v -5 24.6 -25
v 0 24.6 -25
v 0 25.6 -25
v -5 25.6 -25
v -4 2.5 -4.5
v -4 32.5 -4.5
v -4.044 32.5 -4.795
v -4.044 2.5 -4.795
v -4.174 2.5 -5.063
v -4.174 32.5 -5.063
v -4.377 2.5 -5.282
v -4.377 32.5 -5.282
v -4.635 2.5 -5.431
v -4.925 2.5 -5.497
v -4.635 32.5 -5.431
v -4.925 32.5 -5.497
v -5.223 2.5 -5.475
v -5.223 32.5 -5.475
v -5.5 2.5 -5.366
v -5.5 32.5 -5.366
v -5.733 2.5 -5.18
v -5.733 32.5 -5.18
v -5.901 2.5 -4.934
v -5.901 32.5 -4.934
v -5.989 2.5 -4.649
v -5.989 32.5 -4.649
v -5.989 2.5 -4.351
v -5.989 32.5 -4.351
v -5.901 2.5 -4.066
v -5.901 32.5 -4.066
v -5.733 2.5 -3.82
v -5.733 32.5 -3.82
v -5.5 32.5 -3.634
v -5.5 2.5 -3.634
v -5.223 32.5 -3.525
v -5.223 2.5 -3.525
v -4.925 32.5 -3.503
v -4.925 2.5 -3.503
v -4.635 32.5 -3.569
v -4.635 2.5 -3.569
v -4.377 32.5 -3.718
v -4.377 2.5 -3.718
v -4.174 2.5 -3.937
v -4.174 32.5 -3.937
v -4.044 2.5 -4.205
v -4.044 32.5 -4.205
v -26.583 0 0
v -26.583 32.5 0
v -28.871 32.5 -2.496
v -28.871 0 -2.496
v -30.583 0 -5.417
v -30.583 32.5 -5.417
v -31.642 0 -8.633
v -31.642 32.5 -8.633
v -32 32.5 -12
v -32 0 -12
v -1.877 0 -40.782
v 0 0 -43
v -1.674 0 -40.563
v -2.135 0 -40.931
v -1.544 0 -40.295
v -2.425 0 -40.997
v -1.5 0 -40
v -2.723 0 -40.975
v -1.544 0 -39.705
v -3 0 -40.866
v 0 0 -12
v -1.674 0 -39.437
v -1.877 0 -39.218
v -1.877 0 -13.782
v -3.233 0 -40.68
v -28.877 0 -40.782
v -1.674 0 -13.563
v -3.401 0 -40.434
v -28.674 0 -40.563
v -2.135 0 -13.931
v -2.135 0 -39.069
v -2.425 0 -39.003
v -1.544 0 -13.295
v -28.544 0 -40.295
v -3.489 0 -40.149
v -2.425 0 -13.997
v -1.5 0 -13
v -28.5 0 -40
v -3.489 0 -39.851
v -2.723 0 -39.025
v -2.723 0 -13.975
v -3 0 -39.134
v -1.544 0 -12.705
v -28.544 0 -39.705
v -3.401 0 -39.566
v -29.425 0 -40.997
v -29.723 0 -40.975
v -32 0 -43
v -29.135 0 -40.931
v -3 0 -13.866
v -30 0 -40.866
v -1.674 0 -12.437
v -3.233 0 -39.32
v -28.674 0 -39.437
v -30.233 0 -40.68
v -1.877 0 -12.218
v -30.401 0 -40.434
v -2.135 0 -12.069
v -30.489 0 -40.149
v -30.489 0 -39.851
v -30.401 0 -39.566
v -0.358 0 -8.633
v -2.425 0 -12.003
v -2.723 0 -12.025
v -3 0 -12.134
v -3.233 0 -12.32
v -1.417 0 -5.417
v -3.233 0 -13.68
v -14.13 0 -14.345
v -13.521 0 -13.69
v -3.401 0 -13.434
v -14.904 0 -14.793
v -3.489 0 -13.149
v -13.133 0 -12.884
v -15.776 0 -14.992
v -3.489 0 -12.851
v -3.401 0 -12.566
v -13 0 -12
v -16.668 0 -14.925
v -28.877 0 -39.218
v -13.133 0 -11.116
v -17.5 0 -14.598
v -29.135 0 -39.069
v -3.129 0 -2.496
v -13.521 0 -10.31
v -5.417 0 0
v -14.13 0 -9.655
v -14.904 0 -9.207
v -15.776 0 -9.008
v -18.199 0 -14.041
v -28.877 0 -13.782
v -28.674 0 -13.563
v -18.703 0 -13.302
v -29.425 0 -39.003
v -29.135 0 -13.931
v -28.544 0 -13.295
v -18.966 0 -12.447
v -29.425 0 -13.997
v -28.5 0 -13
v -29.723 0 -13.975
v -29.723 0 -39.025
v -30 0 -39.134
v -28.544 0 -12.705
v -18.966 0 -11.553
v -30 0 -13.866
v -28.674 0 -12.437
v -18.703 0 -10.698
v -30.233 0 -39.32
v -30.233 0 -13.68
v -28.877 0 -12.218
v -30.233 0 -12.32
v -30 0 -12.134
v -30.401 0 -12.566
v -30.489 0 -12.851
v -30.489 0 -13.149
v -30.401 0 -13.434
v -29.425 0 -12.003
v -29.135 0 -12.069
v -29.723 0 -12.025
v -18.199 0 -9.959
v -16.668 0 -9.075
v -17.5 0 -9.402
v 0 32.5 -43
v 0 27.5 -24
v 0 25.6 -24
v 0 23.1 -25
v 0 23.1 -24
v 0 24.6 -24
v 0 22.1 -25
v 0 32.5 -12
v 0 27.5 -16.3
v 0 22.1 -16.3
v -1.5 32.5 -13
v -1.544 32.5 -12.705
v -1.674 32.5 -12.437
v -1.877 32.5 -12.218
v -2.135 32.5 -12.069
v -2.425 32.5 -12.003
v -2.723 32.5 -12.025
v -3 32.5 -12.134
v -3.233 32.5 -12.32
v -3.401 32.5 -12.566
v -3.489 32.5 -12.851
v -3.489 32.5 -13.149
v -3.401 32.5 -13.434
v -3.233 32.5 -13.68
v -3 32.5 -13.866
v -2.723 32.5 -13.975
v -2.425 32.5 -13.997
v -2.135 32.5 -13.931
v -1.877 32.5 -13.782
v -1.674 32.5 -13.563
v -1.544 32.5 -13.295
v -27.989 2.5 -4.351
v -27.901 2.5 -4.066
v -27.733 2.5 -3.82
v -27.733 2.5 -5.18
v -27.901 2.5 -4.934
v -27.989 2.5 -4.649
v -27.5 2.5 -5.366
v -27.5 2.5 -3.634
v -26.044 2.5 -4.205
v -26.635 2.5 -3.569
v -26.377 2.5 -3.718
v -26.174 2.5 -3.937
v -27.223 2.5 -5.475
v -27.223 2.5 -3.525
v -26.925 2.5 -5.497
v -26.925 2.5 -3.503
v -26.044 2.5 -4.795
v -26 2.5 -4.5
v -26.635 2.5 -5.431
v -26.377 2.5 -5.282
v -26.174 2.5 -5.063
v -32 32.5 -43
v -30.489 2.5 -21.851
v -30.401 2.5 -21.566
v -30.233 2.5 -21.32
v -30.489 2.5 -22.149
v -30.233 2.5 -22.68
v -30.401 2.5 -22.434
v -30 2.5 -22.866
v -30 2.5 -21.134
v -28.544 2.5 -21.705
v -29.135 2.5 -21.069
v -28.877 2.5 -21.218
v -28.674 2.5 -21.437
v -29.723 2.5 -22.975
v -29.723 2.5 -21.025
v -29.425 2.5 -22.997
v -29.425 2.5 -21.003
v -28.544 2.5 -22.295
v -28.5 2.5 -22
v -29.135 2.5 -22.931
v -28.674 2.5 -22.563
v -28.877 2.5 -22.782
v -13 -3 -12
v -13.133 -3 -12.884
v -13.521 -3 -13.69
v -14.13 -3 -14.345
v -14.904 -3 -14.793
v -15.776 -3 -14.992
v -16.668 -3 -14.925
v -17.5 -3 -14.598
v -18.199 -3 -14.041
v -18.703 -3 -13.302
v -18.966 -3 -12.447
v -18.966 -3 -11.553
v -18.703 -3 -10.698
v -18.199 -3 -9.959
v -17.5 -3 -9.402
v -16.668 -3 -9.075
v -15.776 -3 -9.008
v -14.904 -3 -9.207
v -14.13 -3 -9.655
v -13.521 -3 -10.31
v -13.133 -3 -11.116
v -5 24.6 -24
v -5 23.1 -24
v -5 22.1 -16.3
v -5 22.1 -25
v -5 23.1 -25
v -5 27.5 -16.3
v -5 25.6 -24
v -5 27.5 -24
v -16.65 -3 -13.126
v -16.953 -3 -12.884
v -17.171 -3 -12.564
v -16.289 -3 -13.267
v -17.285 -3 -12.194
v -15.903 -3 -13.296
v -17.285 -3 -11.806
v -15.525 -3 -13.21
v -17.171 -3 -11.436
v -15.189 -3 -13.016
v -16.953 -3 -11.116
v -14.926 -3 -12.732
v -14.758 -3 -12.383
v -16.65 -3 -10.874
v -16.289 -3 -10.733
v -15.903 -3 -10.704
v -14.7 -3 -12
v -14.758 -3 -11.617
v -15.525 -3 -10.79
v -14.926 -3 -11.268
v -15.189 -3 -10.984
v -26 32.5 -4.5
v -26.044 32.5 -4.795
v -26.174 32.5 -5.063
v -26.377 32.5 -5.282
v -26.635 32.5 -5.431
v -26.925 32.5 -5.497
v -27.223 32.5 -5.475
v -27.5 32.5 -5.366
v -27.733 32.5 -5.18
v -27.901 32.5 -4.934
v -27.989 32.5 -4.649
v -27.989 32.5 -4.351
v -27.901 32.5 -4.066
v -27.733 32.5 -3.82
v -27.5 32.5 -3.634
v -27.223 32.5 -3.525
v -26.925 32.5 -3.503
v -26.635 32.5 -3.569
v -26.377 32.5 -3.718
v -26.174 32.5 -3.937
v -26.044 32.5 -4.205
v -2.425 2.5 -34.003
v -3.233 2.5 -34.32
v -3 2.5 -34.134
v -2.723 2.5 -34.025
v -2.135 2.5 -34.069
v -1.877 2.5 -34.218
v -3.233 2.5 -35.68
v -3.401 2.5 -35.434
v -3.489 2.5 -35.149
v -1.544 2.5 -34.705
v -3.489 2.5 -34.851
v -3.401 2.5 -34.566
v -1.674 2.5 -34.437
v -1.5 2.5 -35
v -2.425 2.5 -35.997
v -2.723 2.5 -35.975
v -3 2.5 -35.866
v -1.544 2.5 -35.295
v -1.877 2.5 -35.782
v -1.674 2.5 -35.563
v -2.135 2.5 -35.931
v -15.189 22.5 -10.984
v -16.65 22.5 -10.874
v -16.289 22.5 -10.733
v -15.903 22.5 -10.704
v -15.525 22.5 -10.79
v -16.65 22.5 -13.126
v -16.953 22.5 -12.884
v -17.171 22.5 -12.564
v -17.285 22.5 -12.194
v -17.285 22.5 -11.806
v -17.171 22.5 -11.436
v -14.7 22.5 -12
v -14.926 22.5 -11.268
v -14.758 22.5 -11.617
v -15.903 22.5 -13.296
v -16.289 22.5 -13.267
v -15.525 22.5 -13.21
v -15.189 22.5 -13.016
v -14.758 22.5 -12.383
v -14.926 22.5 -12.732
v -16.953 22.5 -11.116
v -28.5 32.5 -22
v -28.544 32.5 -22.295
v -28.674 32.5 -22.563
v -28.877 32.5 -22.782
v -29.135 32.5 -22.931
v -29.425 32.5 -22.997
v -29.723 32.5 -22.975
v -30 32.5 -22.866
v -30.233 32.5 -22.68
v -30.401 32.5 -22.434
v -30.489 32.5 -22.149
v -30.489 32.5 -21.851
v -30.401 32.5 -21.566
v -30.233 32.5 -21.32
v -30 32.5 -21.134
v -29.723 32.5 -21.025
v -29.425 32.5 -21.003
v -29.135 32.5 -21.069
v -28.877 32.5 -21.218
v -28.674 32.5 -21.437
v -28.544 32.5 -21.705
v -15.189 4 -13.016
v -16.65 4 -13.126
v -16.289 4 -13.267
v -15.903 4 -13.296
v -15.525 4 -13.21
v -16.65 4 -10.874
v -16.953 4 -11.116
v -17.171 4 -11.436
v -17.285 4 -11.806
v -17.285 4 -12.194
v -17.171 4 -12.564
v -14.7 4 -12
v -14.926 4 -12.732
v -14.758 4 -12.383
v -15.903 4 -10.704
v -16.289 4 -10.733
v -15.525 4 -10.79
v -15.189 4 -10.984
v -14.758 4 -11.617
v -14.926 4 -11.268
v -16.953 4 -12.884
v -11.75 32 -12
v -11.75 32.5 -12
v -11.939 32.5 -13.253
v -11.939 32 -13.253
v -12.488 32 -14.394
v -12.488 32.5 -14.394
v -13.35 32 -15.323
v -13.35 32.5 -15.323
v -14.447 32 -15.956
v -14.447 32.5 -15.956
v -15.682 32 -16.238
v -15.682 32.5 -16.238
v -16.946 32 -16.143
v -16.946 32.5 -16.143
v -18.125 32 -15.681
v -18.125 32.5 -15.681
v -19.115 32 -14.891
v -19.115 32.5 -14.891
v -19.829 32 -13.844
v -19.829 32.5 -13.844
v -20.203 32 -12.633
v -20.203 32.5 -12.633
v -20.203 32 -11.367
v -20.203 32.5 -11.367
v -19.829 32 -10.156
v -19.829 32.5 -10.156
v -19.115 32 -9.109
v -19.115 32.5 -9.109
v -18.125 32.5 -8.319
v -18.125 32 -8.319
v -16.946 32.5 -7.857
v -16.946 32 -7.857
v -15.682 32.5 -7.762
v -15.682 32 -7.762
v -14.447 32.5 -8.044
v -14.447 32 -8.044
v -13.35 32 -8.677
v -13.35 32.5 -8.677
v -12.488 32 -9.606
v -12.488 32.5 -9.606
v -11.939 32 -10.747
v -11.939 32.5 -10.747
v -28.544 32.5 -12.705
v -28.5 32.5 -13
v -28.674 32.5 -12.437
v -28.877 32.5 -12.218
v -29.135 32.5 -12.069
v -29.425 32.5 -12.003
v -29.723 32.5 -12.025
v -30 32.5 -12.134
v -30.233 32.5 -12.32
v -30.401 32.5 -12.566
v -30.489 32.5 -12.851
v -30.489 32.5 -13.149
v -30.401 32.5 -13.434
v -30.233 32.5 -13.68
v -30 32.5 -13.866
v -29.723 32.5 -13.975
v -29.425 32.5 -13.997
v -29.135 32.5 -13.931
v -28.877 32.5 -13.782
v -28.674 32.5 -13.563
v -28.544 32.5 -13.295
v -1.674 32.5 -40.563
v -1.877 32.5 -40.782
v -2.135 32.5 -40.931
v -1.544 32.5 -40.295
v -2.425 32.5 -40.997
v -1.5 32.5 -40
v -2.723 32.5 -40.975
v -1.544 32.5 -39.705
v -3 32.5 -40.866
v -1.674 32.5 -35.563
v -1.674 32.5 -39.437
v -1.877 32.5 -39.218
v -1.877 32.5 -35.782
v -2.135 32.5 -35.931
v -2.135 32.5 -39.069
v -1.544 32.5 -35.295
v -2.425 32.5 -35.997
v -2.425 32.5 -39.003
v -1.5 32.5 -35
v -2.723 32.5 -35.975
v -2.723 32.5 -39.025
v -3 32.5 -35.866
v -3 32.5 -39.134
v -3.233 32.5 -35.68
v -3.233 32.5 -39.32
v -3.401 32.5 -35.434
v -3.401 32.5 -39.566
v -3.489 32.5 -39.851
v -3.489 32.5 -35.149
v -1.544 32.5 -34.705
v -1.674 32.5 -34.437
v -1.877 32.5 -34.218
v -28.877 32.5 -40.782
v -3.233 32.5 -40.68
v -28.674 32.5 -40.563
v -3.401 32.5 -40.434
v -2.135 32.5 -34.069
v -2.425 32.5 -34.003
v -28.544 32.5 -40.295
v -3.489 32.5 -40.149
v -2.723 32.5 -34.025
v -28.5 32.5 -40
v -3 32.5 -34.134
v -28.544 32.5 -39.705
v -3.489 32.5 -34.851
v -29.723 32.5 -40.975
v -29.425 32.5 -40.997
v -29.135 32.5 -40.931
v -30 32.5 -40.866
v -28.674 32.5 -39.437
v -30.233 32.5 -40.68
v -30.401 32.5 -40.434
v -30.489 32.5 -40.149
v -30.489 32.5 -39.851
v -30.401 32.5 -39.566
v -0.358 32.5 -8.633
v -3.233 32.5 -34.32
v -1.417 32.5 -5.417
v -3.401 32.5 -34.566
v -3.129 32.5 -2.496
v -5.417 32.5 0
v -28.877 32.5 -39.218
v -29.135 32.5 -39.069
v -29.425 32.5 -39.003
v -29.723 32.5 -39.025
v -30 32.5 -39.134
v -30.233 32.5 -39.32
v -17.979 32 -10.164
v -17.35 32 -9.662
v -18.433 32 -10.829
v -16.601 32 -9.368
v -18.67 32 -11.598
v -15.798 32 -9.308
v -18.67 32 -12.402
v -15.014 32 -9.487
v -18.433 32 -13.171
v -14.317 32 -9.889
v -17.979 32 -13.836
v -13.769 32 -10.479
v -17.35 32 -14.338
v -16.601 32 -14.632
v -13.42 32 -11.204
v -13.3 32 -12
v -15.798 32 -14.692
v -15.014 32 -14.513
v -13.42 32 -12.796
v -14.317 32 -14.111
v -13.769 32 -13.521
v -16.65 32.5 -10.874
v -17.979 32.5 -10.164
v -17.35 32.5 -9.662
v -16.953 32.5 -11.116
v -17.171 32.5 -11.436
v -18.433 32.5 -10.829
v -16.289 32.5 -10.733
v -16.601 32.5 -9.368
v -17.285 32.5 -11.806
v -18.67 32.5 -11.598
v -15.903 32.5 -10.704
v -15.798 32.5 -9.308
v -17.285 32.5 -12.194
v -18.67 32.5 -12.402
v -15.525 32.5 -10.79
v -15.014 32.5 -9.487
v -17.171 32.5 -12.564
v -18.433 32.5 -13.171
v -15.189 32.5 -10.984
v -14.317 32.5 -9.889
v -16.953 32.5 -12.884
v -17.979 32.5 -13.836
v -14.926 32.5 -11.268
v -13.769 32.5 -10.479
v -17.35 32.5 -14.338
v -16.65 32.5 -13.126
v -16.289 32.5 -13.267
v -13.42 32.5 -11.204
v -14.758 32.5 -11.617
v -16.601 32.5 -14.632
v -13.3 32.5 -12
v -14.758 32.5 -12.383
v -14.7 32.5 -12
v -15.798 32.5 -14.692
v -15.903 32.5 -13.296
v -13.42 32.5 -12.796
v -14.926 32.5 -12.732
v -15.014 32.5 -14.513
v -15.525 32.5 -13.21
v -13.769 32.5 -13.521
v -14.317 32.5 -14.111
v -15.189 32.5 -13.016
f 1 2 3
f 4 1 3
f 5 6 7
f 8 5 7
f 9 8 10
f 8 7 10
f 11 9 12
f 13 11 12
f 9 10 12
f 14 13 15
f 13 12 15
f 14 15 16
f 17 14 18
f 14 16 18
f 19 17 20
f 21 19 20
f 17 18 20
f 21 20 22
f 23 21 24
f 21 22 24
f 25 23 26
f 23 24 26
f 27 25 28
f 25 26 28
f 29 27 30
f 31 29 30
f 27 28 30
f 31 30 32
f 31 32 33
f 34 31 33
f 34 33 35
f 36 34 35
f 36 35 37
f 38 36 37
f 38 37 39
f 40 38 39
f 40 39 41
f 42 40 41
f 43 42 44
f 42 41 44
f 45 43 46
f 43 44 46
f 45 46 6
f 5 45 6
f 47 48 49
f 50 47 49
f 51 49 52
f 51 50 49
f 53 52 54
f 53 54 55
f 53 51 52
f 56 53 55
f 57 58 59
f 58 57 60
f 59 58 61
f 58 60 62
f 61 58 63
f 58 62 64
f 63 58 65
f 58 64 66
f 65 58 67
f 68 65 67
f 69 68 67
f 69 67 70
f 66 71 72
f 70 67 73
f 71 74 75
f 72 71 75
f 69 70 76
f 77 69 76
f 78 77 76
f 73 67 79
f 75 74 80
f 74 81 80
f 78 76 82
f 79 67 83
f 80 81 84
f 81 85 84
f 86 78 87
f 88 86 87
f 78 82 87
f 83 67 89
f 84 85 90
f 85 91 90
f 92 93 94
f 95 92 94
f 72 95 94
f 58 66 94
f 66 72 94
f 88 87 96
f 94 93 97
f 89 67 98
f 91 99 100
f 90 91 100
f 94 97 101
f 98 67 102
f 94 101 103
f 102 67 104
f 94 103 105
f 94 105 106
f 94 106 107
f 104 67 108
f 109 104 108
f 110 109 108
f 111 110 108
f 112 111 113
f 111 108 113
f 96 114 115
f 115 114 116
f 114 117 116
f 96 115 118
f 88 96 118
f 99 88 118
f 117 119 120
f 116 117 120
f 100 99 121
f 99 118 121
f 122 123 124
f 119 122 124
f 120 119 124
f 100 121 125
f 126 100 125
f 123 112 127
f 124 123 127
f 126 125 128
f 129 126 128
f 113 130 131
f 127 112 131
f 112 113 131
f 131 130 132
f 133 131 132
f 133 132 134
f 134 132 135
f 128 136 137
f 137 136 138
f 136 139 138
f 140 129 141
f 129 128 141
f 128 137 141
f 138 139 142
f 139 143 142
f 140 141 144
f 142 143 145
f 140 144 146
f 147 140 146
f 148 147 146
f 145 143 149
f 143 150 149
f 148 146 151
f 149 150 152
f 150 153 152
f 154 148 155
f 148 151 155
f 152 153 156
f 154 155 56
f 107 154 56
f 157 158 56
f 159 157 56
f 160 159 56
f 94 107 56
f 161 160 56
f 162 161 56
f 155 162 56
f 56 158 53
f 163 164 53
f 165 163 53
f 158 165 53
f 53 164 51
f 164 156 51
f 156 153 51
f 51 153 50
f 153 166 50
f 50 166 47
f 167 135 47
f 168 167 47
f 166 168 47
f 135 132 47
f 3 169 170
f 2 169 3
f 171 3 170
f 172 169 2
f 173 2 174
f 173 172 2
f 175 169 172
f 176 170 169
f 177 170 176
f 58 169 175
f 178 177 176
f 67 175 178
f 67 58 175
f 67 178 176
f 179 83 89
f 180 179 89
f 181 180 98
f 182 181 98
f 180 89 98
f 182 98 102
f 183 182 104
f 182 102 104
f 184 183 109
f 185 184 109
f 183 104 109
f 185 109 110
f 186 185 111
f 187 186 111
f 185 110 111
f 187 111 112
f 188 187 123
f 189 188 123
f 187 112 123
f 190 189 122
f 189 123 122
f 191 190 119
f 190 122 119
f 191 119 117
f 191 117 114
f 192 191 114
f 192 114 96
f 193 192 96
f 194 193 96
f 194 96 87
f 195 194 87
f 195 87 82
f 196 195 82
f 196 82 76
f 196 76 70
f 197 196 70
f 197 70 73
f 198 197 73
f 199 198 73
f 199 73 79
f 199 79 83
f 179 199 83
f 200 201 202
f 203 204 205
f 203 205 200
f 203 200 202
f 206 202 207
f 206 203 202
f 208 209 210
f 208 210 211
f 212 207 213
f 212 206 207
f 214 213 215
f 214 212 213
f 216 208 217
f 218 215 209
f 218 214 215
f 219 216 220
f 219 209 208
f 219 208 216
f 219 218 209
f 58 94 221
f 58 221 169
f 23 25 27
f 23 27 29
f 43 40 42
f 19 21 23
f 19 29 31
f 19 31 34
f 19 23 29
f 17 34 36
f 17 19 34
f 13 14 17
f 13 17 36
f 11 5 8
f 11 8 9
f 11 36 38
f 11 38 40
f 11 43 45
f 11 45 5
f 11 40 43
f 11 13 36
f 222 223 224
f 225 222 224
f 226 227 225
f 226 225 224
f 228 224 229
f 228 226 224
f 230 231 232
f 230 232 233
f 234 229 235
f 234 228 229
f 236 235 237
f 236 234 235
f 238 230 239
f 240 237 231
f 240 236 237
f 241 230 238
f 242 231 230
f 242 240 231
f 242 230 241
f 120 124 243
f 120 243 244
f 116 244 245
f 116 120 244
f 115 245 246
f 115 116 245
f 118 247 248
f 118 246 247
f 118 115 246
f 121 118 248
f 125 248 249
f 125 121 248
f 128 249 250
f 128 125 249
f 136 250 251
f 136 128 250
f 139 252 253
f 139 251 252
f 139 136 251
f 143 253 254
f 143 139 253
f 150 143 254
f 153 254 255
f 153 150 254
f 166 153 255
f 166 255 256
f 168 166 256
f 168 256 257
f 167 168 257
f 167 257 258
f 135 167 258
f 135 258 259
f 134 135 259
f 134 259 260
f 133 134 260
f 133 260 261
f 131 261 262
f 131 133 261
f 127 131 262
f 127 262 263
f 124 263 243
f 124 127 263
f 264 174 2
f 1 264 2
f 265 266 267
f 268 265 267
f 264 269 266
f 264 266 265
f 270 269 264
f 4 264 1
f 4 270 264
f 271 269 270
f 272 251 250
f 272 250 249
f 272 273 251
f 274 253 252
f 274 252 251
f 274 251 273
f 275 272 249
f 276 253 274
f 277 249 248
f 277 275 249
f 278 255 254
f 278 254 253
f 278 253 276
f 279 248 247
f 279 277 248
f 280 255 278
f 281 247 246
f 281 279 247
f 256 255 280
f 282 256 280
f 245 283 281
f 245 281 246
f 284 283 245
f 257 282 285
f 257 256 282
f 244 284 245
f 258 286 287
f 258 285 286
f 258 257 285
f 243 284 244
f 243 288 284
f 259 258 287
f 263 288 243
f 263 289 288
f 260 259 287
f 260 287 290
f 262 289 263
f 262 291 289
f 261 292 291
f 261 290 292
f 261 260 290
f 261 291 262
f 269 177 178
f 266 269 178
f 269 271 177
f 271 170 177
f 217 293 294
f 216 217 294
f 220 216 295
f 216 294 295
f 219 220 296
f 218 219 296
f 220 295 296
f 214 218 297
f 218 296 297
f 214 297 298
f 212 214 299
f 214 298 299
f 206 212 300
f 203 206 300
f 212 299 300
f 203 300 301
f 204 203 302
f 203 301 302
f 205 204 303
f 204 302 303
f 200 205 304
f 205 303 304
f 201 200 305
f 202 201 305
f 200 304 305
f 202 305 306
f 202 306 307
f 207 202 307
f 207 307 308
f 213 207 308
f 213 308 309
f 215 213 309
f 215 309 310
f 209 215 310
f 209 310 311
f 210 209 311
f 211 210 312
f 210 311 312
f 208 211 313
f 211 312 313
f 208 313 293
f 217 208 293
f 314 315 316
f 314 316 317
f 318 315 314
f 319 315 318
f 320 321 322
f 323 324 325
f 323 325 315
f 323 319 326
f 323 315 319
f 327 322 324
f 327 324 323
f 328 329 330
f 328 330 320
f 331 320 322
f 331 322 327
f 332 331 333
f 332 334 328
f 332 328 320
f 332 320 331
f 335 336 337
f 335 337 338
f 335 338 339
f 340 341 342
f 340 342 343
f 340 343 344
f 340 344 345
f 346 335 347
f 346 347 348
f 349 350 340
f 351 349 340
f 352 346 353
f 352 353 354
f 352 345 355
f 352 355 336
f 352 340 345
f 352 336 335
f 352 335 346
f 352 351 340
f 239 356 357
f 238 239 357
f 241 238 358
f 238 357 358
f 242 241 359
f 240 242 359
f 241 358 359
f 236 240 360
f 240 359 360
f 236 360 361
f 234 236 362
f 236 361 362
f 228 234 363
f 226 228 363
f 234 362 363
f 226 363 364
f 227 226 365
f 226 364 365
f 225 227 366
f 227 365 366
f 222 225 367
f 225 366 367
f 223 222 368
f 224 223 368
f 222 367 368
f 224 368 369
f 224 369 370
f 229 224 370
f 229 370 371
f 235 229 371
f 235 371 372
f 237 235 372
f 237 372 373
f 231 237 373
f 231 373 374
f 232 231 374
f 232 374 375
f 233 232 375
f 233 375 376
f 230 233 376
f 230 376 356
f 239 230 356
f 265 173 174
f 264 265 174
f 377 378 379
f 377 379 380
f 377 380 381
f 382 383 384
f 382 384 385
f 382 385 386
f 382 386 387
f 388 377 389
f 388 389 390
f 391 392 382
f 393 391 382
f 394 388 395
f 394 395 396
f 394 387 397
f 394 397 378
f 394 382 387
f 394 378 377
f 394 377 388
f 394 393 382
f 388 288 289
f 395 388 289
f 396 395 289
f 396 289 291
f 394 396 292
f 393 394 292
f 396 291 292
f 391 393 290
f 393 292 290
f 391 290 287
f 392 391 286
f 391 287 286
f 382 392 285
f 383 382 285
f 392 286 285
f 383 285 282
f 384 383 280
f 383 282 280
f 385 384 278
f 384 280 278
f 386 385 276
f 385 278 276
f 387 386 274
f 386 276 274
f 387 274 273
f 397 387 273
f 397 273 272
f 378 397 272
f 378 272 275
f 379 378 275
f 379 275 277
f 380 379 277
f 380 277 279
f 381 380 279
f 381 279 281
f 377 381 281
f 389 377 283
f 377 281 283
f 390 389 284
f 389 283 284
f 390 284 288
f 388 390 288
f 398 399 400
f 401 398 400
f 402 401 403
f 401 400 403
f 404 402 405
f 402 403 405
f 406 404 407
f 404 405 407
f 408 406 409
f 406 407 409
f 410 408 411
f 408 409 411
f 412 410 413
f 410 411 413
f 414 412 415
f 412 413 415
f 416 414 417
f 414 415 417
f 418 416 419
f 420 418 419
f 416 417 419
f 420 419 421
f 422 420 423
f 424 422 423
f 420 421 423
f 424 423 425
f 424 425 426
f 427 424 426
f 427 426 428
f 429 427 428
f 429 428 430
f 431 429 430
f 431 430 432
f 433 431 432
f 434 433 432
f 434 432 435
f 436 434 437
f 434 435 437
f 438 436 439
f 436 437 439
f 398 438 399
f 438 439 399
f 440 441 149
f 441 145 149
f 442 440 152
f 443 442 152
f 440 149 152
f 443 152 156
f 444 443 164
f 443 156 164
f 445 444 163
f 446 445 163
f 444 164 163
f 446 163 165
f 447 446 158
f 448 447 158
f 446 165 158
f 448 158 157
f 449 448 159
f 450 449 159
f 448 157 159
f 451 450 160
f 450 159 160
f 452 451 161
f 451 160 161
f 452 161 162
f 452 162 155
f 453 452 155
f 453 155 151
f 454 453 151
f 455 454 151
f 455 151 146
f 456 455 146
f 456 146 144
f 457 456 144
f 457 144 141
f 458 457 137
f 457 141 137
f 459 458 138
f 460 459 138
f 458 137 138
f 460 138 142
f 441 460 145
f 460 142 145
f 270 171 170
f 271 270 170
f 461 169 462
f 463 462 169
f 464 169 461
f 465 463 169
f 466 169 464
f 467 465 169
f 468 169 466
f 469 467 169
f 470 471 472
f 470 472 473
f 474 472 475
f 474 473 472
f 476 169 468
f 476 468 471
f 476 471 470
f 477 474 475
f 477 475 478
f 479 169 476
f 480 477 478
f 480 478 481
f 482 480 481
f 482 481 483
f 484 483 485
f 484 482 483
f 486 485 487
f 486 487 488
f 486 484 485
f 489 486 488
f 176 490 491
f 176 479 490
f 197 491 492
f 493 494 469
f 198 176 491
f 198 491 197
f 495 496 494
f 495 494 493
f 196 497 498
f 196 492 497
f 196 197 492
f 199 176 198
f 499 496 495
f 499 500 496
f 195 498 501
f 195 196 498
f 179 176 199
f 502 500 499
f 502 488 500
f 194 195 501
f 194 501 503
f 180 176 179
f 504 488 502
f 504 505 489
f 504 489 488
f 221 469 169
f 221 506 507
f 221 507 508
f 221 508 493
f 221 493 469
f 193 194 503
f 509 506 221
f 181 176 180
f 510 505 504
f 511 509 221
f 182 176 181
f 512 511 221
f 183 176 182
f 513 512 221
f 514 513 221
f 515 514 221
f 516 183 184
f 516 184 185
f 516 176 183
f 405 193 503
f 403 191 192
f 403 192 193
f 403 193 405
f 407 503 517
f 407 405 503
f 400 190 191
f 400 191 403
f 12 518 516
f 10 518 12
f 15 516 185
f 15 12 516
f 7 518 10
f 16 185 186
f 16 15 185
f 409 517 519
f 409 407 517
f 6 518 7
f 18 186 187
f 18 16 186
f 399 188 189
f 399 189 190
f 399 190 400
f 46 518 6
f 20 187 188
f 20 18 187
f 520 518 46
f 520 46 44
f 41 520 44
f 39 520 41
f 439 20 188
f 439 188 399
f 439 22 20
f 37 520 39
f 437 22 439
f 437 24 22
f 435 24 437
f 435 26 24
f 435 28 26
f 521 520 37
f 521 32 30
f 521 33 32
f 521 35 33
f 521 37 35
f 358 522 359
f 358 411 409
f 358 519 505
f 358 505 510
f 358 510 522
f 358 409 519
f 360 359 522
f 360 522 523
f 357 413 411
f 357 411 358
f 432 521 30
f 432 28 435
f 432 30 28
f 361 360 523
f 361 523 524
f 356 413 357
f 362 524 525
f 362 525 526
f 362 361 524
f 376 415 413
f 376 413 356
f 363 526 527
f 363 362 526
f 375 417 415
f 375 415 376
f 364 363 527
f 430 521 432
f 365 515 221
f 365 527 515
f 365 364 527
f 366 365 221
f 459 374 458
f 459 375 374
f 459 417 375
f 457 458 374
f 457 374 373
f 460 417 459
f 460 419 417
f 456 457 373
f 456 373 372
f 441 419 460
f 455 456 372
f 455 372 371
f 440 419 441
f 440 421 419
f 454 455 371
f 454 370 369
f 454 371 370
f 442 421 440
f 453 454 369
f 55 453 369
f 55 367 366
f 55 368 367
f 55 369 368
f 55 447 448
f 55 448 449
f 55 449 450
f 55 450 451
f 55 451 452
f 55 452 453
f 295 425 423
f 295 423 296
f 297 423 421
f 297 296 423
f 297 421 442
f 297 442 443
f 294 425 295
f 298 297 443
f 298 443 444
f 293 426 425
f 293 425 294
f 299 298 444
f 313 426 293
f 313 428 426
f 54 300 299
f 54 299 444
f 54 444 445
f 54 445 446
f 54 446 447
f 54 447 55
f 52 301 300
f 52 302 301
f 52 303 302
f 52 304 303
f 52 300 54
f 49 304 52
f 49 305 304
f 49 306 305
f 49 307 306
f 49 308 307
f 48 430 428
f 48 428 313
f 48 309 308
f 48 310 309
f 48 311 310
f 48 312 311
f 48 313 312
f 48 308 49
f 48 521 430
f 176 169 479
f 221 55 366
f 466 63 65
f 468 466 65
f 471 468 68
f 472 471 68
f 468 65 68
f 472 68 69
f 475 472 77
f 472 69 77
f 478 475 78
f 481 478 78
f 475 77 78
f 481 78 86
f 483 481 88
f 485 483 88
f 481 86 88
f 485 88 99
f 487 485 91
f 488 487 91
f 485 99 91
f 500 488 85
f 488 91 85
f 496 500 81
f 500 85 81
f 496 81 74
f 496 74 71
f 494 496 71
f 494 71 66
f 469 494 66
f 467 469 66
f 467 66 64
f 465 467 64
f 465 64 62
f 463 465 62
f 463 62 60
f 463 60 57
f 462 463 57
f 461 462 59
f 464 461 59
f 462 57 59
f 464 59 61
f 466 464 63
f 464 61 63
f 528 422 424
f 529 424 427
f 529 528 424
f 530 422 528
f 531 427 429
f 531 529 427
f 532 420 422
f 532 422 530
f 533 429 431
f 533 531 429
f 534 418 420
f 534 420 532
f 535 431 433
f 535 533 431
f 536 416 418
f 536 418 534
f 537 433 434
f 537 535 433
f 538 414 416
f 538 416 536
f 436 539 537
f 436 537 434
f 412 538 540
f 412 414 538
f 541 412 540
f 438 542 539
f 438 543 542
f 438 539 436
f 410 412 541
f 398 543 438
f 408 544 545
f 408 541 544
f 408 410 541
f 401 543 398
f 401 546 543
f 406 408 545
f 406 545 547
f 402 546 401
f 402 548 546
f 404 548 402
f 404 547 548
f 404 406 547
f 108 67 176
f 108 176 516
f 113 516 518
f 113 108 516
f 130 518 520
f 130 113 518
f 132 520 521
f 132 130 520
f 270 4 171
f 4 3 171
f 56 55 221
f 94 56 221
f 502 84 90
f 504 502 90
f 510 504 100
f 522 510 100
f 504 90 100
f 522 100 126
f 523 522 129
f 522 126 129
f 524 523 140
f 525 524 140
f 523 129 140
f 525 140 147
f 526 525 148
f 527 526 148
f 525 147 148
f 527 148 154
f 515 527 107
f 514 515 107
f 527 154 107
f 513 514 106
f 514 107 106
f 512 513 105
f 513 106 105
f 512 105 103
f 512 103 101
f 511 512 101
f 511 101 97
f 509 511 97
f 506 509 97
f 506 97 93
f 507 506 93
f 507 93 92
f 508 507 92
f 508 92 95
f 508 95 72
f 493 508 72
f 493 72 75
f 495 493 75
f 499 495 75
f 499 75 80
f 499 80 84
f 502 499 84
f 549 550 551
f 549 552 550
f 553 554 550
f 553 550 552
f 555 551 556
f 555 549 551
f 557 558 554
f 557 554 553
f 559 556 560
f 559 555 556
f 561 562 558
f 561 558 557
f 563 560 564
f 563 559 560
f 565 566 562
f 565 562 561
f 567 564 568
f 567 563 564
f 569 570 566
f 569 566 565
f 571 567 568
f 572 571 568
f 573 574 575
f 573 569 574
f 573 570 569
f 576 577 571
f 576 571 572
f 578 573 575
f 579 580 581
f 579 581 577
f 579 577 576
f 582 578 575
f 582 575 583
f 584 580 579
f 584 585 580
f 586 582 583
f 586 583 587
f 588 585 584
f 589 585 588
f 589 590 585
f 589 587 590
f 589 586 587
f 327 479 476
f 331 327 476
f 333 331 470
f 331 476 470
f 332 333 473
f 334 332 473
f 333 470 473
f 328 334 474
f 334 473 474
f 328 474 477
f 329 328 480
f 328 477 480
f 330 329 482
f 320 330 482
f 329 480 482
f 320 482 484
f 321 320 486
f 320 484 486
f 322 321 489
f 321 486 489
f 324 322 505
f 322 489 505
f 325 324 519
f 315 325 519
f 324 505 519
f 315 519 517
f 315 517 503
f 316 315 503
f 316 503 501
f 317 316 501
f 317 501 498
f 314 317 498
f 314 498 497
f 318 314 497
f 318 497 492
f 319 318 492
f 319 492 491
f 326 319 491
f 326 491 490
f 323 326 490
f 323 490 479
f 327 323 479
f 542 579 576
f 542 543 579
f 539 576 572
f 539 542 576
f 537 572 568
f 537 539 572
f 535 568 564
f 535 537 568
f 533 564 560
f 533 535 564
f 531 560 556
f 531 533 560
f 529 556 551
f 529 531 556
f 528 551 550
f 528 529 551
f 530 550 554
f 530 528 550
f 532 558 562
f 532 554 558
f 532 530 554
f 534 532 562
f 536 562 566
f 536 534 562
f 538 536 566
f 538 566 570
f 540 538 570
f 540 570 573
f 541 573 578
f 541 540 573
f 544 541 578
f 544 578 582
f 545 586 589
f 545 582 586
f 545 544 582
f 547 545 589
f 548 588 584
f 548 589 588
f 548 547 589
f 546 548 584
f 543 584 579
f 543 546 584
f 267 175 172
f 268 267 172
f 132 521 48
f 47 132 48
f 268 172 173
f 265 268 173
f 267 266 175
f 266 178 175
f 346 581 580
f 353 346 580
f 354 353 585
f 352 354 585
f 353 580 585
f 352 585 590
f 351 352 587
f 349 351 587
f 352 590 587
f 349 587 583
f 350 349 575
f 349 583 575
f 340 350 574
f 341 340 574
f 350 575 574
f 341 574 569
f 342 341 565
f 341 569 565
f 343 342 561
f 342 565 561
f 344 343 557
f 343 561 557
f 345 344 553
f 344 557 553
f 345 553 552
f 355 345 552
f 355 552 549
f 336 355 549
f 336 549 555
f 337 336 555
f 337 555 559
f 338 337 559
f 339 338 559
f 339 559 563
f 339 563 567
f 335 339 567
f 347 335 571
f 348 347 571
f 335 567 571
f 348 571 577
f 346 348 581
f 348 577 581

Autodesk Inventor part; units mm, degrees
ref_plane "YZ Plane" through (0, 0, 0) normal (1, 0, 0) x (0, 1, 0)
ref_plane "XZ Plane" through (0, 0, 0) normal (0, 1, 0) x (-1, 0, 0)
ref_plane "XY Plane" through (0, 0, 0) normal (0, 0, 1) x (1, 0, 0)
sketch "スケッチ1" plane through (0, 0, 0) normal (0, 1, 0) x (-1, 0, 0)
  line L0 (0, 0) -> (32, 0)
  line L1 (32, 0) -> (32, -43)
  line L2 (32, -43) -> (0, -43)
  line L3 (0, -43) -> (0, 0)
  dimension "d0" = 32
  dimension "d1" = 43
extrude "押し出し1" add sketch "スケッチ1" along normal blind 32.5
sketch "スケッチ2" plane through (0, 0, 0) normal (0, -1, 0) x (1, 0, 0)
  line L0 (-32, -43) -> (-32, 0) construction
  line L1 (-32, -21.5) -> (0, -21.5) construction
  line L2 (0, 0) -> (0, -43) construction
  line L3 (-16, -21.5) -> (-16, -12) construction
  line L4 (-32, 0) -> (-32, -43) projected
  arc A0 (-26.583, 0) -> (-32, -12) centre (-16, -12) ccw
  arc A1 (0, -12) -> (-5.417, 0) centre (-16, -12) ccw
  line L5 (-32, -12) -> (-32, 0)
  line L6 (0, 0) -> (-32, 0) projected
  line L7 (-5.417, 0) -> (0, 0)
  line L8 (0, 0) -> (0, -12)
  line L9 (-32, 0) -> (-26.583, 0)
  dimension "d4" = 9.5
extrude "押し出し2" cut sketch "スケッチ2" against normal blind 32.5
sketch "スケッチ3" plane through (0, 0, 0) normal (0, -1, 0) x (1, 0, 0)
  line L0 (-32, -21.5) -> (0, -21.5) construction
  line L1 (0, -21.5) -> (0, -43) construction
  line L2 (-5.417, 0) -> (-26.583, 0) construction
  line L3 (-16, 0) -> (-16, -43) construction
  line L4 (-32, -43) -> (0, -43) construction
  line L5 (-16, -21.5) -> (-16, -13) construction
  line L6 (-16, -21.5) -> (-29.5, -21.5) construction
  circle A0 centre (-29.5, -13) radius 1
  line L7 (-16, -21.5) -> (-2.5, -21.5) construction
  circle A1 centre (-2.5, -13) radius 1
  line L8 (-16, -21.5) -> (-16, -40) construction
  circle A2 centre (-29.5, -40) radius 1
  circle A3 centre (-2.5, -40) radius 1
  point P0 (0, 0)
  dimension "d8" = 8.5
  dimension "d9" = 13.5
  dimension "d10" = 2
  dimension "d11" = 13.5
  dimension "d12" = 2
  dimension "d13" = 18.5
  dimension "d14" = 2
  dimension "d15" = 2
extrude "押し出し3" cut sketch "スケッチ3" against normal blind 32.5
sketch "スケッチ4" plane through (0, 32.5, 0) normal (0, 1, 0) x (1, 0, 0)
  line L0 (-5.417, 0) -> (-26.583, 0) construction
  line L1 (-32, 21.5) -> (0, 21.5) construction
  line L2 (0, 21.5) -> (0, 43) construction
  line L3 (-16, 0) -> (-16, 43) construction
  line L4 (-32, 43) -> (0, 43) construction
  line L5 (-16, 21.5) -> (-16, 13) construction
  line L6 (-16, 21.5) -> (-29.5, 21.5) construction
  circle A0 centre (-29.5, 13) radius 1
  line L7 (-16, 21.5) -> (-2.5, 21.5) construction
  circle A1 centre (-2.5, 13) radius 1
  line L8 (-16, 21.5) -> (-16, 40) construction
  circle A2 centre (-29.5, 40) radius 1
  circle A3 centre (-2.5, 40) radius 1
  line L9 (-29.5, 21.5) -> (-29.5, 22) construction
  line L10 (-2.5, 21.5) -> (-2.5, 35) construction
  line L11 (-16, 21.5) -> (-16, 4.5) construction
  line L12 (-16, 4.5) -> (-5, 4.5) construction
  line L13 (-16, 4.5) -> (-27, 4.5) construction
  circle A4 centre (-2.5, 35) radius 1
  circle A5 centre (-29.5, 22) radius 1
  circle A6 centre (-27, 4.5) radius 1
  circle A7 centre (-5, 4.5) radius 1
  line L14 (0, 43) -> (-32, 43) projected
  line L15 (0, 43) -> (-32, 43)
  line L16 (-32, 43) -> (-32, 12) projected
  line L17 (-32, 43) -> (-32, 12)
  line L18 (0, 12) -> (0, 43) projected
  line L19 (0, 43) -> (0, 12)
  line L20 (-26.583, 0) -> (-5.417, 0) projected
  line L21 (-5.417, 0) -> (-26.583, 0)
  arc A8 (-32, 12) -> (-26.583, 0) centre (-16, 12) ccw
  arc A9 (-5.417, 0) -> (0, 12) centre (-16, 12) ccw projected
  arc A10 (-5.417, 0) -> (0, 12) centre (-16, 12) ccw
  point P0 (0, 0)
  point P1 (0, 0)
  dimension "d26" = 0.5
  dimension "d27" = 13.5
  dimension "d28" = 17
  dimension "d29" = 11
  dimension "d30" = 11
  dimension "d31" = 2
  dimension "d32" = 2
  dimension "d33" = 2
  dimension "d34" = 2
extrude "押し出し4" cut sketch "スケッチ4" against normal blind 30 contours A4 | A5 | A6 | A7
sketch "スケッチ5" plane through (0, 0, 0) normal (0, -1, 0) x (1, 0, 0)
  line L0 (-32, -21.5) -> (0, -21.5) construction
  line L1 (0, -21.5) -> (0, -43) construction
  line L2 (-5.417, 0) -> (-26.583, 0) construction
  line L3 (-16, 0) -> (-16, -43) construction
  line L4 (-32, -43) -> (0, -43) construction
  line L5 (-16, -21.5) -> (-16, -12) construction
  line L6 (-16, -21.5) -> (-29.5, -21.5) construction
  circle A0 centre (-29.5, -13) radius 1
  line L7 (-16, -21.5) -> (-2.5, -21.5) construction
  circle A1 centre (-2.5, -13) radius 1
  line L8 (-16, -21.5) -> (-16, -40) construction
  circle A2 centre (-29.5, -40) radius 1
  circle A3 centre (-2.5, -40) radius 1
  circle A4 centre (-16, -12) radius 3
  point P0 (0, 0)
  point P1 (0, 0)
  dimension "d37" = 9.5
  dimension "d38" = 13.5
  dimension "d39" = 2
  dimension "d40" = 13.5
  dimension "d41" = 2
  dimension "d42" = 18.5
  dimension "d43" = 2
  dimension "d44" = 2
  dimension "d45" = 6
extrude "押し出し5" add sketch "スケッチ5" along normal blind 3 contours A4
sketch "スケッチ6" plane through (-16, -3, -12) normal (0, -1, 0) x (1, 0, 0)
  circle A0 centre (0, 0) radius 1.3
  point P0 (16, 12)
  dimension "d48" = 2.6
extrude "押し出し6" cut sketch "スケッチ6" against normal blind 7
sketch "スケッチ7" plane through (0, 32.5, 0) normal (0, 1, 0) x (1, 0, 0)
  line L0 (-5.417, 0) -> (-26.583, 0) construction
  line L1 (-16, 21.5) -> (-29.5, 21.5) construction
  line L2 (-16, 21.5) -> (-16, 13) construction
  line L3 (-16, 21.5) -> (-2.5, 21.5) construction
  line L4 (-32, 21.5) -> (0, 21.5) construction
  line L5 (-32, 43) -> (0, 43) construction
  line L6 (-16, 21.5) -> (-16, 40) construction
  line L7 (0, 21.5) -> (0, 43) construction
  line L8 (-16, 0) -> (-16, 43) construction
  line L9 (-29.5, 21.5) -> (-29.5, 22) construction
  line L10 (-16, 21.5) -> (-16, 12) construction
  line L11 (-16, 12) -> (-5, 12) construction
  line L12 (-16, 12) -> (-27, 12) construction
  circle A0 centre (-16, 12) radius 1.3 projected
  circle A1 centre (-16, 12) radius 4.25
  point P0 (0, 0)
  point P1 (0, 0)
  point P2 (0, 0)
  dimension "d53" = 9.5
  dimension "d60" = 8.5
extrude "押し出し7" cut sketch "スケッチ7" against normal blind 0.5 contours A0 | A1
sketch "スケッチ8" plane through (-16, 32, -12) normal (0, 1, 0) x (1, 0, 0)
  circle A0 centre (0, 0) radius 2.7
  point P0 (16, -12)
  dimension "d63" = 5.4
extrude "押し出し8" add sketch "スケッチ8" along normal blind 0.5
sketch "スケッチ9" plane through (-16, 32.5, -12) normal (0, 1, 0) x (1, 0, 0)
  circle A0 centre (0, 0) radius 1.3
  point P0 (16, -12)
  dimension "d66" = 2.6
extrude "押し出し9" cut sketch "スケッチ9" against normal blind 10
sketch "スケッチ10" plane through (0, 0, -43) normal (1, 0, 0) x (0, 0, -1)
  line L0 (0, 0) -> (0, 32.5) construction
  line L1 (0, 16.25) -> (-21.5, 16.25) construction
  line L2 (-22, 32.5) -> (-20, 32.5) construction
  line L3 (0, 0) -> (-31, 0) construction
  line L4 (-21, 32.5) -> (-21, 27.5) construction
  line L5 (-21, 27.5) -> (-26.7, 27.5)
  line L6 (-26.7, 27.5) -> (-26.7, 24.6)
  line L7 (-26.7, 24.6) -> (-18, 24.6)
  line L8 (-18, 24.6) -> (-18, 25.6)
  line L9 (-18, 25.6) -> (-19, 25.6)
  line L10 (-19, 25.6) -> (-19, 27.5)
  line L11 (-19, 27.5) -> (-21, 27.5)
  line L12 (-26.7, 24.6) -> (-26.7, 22.1)
  line L13 (-26.7, 22.1) -> (-18, 22.1)
  line L14 (-18, 22.1) -> (-18, 23.1)
  line L15 (-18, 23.1) -> (-19, 23.1)
  line L16 (-19, 23.1) -> (-19, 24.6)
  point P0 (-43, 0)
  dimension "d69" = 21.5
  dimension "d71" = 5
  dimension "d72" = 2.9
  dimension "d73" = 5.7
  dimension "d74" = 8.7
  dimension "d75" = 1
  dimension "d76" = 1
  dimension "d79" = 2.5
  dimension "d80" = 1
  dimension "d81" = 1
extrude "押し出し10" cut sketch "スケッチ10" against normal blind 5
properties part number "Servo" material "プラスチック、不透明 黒"
